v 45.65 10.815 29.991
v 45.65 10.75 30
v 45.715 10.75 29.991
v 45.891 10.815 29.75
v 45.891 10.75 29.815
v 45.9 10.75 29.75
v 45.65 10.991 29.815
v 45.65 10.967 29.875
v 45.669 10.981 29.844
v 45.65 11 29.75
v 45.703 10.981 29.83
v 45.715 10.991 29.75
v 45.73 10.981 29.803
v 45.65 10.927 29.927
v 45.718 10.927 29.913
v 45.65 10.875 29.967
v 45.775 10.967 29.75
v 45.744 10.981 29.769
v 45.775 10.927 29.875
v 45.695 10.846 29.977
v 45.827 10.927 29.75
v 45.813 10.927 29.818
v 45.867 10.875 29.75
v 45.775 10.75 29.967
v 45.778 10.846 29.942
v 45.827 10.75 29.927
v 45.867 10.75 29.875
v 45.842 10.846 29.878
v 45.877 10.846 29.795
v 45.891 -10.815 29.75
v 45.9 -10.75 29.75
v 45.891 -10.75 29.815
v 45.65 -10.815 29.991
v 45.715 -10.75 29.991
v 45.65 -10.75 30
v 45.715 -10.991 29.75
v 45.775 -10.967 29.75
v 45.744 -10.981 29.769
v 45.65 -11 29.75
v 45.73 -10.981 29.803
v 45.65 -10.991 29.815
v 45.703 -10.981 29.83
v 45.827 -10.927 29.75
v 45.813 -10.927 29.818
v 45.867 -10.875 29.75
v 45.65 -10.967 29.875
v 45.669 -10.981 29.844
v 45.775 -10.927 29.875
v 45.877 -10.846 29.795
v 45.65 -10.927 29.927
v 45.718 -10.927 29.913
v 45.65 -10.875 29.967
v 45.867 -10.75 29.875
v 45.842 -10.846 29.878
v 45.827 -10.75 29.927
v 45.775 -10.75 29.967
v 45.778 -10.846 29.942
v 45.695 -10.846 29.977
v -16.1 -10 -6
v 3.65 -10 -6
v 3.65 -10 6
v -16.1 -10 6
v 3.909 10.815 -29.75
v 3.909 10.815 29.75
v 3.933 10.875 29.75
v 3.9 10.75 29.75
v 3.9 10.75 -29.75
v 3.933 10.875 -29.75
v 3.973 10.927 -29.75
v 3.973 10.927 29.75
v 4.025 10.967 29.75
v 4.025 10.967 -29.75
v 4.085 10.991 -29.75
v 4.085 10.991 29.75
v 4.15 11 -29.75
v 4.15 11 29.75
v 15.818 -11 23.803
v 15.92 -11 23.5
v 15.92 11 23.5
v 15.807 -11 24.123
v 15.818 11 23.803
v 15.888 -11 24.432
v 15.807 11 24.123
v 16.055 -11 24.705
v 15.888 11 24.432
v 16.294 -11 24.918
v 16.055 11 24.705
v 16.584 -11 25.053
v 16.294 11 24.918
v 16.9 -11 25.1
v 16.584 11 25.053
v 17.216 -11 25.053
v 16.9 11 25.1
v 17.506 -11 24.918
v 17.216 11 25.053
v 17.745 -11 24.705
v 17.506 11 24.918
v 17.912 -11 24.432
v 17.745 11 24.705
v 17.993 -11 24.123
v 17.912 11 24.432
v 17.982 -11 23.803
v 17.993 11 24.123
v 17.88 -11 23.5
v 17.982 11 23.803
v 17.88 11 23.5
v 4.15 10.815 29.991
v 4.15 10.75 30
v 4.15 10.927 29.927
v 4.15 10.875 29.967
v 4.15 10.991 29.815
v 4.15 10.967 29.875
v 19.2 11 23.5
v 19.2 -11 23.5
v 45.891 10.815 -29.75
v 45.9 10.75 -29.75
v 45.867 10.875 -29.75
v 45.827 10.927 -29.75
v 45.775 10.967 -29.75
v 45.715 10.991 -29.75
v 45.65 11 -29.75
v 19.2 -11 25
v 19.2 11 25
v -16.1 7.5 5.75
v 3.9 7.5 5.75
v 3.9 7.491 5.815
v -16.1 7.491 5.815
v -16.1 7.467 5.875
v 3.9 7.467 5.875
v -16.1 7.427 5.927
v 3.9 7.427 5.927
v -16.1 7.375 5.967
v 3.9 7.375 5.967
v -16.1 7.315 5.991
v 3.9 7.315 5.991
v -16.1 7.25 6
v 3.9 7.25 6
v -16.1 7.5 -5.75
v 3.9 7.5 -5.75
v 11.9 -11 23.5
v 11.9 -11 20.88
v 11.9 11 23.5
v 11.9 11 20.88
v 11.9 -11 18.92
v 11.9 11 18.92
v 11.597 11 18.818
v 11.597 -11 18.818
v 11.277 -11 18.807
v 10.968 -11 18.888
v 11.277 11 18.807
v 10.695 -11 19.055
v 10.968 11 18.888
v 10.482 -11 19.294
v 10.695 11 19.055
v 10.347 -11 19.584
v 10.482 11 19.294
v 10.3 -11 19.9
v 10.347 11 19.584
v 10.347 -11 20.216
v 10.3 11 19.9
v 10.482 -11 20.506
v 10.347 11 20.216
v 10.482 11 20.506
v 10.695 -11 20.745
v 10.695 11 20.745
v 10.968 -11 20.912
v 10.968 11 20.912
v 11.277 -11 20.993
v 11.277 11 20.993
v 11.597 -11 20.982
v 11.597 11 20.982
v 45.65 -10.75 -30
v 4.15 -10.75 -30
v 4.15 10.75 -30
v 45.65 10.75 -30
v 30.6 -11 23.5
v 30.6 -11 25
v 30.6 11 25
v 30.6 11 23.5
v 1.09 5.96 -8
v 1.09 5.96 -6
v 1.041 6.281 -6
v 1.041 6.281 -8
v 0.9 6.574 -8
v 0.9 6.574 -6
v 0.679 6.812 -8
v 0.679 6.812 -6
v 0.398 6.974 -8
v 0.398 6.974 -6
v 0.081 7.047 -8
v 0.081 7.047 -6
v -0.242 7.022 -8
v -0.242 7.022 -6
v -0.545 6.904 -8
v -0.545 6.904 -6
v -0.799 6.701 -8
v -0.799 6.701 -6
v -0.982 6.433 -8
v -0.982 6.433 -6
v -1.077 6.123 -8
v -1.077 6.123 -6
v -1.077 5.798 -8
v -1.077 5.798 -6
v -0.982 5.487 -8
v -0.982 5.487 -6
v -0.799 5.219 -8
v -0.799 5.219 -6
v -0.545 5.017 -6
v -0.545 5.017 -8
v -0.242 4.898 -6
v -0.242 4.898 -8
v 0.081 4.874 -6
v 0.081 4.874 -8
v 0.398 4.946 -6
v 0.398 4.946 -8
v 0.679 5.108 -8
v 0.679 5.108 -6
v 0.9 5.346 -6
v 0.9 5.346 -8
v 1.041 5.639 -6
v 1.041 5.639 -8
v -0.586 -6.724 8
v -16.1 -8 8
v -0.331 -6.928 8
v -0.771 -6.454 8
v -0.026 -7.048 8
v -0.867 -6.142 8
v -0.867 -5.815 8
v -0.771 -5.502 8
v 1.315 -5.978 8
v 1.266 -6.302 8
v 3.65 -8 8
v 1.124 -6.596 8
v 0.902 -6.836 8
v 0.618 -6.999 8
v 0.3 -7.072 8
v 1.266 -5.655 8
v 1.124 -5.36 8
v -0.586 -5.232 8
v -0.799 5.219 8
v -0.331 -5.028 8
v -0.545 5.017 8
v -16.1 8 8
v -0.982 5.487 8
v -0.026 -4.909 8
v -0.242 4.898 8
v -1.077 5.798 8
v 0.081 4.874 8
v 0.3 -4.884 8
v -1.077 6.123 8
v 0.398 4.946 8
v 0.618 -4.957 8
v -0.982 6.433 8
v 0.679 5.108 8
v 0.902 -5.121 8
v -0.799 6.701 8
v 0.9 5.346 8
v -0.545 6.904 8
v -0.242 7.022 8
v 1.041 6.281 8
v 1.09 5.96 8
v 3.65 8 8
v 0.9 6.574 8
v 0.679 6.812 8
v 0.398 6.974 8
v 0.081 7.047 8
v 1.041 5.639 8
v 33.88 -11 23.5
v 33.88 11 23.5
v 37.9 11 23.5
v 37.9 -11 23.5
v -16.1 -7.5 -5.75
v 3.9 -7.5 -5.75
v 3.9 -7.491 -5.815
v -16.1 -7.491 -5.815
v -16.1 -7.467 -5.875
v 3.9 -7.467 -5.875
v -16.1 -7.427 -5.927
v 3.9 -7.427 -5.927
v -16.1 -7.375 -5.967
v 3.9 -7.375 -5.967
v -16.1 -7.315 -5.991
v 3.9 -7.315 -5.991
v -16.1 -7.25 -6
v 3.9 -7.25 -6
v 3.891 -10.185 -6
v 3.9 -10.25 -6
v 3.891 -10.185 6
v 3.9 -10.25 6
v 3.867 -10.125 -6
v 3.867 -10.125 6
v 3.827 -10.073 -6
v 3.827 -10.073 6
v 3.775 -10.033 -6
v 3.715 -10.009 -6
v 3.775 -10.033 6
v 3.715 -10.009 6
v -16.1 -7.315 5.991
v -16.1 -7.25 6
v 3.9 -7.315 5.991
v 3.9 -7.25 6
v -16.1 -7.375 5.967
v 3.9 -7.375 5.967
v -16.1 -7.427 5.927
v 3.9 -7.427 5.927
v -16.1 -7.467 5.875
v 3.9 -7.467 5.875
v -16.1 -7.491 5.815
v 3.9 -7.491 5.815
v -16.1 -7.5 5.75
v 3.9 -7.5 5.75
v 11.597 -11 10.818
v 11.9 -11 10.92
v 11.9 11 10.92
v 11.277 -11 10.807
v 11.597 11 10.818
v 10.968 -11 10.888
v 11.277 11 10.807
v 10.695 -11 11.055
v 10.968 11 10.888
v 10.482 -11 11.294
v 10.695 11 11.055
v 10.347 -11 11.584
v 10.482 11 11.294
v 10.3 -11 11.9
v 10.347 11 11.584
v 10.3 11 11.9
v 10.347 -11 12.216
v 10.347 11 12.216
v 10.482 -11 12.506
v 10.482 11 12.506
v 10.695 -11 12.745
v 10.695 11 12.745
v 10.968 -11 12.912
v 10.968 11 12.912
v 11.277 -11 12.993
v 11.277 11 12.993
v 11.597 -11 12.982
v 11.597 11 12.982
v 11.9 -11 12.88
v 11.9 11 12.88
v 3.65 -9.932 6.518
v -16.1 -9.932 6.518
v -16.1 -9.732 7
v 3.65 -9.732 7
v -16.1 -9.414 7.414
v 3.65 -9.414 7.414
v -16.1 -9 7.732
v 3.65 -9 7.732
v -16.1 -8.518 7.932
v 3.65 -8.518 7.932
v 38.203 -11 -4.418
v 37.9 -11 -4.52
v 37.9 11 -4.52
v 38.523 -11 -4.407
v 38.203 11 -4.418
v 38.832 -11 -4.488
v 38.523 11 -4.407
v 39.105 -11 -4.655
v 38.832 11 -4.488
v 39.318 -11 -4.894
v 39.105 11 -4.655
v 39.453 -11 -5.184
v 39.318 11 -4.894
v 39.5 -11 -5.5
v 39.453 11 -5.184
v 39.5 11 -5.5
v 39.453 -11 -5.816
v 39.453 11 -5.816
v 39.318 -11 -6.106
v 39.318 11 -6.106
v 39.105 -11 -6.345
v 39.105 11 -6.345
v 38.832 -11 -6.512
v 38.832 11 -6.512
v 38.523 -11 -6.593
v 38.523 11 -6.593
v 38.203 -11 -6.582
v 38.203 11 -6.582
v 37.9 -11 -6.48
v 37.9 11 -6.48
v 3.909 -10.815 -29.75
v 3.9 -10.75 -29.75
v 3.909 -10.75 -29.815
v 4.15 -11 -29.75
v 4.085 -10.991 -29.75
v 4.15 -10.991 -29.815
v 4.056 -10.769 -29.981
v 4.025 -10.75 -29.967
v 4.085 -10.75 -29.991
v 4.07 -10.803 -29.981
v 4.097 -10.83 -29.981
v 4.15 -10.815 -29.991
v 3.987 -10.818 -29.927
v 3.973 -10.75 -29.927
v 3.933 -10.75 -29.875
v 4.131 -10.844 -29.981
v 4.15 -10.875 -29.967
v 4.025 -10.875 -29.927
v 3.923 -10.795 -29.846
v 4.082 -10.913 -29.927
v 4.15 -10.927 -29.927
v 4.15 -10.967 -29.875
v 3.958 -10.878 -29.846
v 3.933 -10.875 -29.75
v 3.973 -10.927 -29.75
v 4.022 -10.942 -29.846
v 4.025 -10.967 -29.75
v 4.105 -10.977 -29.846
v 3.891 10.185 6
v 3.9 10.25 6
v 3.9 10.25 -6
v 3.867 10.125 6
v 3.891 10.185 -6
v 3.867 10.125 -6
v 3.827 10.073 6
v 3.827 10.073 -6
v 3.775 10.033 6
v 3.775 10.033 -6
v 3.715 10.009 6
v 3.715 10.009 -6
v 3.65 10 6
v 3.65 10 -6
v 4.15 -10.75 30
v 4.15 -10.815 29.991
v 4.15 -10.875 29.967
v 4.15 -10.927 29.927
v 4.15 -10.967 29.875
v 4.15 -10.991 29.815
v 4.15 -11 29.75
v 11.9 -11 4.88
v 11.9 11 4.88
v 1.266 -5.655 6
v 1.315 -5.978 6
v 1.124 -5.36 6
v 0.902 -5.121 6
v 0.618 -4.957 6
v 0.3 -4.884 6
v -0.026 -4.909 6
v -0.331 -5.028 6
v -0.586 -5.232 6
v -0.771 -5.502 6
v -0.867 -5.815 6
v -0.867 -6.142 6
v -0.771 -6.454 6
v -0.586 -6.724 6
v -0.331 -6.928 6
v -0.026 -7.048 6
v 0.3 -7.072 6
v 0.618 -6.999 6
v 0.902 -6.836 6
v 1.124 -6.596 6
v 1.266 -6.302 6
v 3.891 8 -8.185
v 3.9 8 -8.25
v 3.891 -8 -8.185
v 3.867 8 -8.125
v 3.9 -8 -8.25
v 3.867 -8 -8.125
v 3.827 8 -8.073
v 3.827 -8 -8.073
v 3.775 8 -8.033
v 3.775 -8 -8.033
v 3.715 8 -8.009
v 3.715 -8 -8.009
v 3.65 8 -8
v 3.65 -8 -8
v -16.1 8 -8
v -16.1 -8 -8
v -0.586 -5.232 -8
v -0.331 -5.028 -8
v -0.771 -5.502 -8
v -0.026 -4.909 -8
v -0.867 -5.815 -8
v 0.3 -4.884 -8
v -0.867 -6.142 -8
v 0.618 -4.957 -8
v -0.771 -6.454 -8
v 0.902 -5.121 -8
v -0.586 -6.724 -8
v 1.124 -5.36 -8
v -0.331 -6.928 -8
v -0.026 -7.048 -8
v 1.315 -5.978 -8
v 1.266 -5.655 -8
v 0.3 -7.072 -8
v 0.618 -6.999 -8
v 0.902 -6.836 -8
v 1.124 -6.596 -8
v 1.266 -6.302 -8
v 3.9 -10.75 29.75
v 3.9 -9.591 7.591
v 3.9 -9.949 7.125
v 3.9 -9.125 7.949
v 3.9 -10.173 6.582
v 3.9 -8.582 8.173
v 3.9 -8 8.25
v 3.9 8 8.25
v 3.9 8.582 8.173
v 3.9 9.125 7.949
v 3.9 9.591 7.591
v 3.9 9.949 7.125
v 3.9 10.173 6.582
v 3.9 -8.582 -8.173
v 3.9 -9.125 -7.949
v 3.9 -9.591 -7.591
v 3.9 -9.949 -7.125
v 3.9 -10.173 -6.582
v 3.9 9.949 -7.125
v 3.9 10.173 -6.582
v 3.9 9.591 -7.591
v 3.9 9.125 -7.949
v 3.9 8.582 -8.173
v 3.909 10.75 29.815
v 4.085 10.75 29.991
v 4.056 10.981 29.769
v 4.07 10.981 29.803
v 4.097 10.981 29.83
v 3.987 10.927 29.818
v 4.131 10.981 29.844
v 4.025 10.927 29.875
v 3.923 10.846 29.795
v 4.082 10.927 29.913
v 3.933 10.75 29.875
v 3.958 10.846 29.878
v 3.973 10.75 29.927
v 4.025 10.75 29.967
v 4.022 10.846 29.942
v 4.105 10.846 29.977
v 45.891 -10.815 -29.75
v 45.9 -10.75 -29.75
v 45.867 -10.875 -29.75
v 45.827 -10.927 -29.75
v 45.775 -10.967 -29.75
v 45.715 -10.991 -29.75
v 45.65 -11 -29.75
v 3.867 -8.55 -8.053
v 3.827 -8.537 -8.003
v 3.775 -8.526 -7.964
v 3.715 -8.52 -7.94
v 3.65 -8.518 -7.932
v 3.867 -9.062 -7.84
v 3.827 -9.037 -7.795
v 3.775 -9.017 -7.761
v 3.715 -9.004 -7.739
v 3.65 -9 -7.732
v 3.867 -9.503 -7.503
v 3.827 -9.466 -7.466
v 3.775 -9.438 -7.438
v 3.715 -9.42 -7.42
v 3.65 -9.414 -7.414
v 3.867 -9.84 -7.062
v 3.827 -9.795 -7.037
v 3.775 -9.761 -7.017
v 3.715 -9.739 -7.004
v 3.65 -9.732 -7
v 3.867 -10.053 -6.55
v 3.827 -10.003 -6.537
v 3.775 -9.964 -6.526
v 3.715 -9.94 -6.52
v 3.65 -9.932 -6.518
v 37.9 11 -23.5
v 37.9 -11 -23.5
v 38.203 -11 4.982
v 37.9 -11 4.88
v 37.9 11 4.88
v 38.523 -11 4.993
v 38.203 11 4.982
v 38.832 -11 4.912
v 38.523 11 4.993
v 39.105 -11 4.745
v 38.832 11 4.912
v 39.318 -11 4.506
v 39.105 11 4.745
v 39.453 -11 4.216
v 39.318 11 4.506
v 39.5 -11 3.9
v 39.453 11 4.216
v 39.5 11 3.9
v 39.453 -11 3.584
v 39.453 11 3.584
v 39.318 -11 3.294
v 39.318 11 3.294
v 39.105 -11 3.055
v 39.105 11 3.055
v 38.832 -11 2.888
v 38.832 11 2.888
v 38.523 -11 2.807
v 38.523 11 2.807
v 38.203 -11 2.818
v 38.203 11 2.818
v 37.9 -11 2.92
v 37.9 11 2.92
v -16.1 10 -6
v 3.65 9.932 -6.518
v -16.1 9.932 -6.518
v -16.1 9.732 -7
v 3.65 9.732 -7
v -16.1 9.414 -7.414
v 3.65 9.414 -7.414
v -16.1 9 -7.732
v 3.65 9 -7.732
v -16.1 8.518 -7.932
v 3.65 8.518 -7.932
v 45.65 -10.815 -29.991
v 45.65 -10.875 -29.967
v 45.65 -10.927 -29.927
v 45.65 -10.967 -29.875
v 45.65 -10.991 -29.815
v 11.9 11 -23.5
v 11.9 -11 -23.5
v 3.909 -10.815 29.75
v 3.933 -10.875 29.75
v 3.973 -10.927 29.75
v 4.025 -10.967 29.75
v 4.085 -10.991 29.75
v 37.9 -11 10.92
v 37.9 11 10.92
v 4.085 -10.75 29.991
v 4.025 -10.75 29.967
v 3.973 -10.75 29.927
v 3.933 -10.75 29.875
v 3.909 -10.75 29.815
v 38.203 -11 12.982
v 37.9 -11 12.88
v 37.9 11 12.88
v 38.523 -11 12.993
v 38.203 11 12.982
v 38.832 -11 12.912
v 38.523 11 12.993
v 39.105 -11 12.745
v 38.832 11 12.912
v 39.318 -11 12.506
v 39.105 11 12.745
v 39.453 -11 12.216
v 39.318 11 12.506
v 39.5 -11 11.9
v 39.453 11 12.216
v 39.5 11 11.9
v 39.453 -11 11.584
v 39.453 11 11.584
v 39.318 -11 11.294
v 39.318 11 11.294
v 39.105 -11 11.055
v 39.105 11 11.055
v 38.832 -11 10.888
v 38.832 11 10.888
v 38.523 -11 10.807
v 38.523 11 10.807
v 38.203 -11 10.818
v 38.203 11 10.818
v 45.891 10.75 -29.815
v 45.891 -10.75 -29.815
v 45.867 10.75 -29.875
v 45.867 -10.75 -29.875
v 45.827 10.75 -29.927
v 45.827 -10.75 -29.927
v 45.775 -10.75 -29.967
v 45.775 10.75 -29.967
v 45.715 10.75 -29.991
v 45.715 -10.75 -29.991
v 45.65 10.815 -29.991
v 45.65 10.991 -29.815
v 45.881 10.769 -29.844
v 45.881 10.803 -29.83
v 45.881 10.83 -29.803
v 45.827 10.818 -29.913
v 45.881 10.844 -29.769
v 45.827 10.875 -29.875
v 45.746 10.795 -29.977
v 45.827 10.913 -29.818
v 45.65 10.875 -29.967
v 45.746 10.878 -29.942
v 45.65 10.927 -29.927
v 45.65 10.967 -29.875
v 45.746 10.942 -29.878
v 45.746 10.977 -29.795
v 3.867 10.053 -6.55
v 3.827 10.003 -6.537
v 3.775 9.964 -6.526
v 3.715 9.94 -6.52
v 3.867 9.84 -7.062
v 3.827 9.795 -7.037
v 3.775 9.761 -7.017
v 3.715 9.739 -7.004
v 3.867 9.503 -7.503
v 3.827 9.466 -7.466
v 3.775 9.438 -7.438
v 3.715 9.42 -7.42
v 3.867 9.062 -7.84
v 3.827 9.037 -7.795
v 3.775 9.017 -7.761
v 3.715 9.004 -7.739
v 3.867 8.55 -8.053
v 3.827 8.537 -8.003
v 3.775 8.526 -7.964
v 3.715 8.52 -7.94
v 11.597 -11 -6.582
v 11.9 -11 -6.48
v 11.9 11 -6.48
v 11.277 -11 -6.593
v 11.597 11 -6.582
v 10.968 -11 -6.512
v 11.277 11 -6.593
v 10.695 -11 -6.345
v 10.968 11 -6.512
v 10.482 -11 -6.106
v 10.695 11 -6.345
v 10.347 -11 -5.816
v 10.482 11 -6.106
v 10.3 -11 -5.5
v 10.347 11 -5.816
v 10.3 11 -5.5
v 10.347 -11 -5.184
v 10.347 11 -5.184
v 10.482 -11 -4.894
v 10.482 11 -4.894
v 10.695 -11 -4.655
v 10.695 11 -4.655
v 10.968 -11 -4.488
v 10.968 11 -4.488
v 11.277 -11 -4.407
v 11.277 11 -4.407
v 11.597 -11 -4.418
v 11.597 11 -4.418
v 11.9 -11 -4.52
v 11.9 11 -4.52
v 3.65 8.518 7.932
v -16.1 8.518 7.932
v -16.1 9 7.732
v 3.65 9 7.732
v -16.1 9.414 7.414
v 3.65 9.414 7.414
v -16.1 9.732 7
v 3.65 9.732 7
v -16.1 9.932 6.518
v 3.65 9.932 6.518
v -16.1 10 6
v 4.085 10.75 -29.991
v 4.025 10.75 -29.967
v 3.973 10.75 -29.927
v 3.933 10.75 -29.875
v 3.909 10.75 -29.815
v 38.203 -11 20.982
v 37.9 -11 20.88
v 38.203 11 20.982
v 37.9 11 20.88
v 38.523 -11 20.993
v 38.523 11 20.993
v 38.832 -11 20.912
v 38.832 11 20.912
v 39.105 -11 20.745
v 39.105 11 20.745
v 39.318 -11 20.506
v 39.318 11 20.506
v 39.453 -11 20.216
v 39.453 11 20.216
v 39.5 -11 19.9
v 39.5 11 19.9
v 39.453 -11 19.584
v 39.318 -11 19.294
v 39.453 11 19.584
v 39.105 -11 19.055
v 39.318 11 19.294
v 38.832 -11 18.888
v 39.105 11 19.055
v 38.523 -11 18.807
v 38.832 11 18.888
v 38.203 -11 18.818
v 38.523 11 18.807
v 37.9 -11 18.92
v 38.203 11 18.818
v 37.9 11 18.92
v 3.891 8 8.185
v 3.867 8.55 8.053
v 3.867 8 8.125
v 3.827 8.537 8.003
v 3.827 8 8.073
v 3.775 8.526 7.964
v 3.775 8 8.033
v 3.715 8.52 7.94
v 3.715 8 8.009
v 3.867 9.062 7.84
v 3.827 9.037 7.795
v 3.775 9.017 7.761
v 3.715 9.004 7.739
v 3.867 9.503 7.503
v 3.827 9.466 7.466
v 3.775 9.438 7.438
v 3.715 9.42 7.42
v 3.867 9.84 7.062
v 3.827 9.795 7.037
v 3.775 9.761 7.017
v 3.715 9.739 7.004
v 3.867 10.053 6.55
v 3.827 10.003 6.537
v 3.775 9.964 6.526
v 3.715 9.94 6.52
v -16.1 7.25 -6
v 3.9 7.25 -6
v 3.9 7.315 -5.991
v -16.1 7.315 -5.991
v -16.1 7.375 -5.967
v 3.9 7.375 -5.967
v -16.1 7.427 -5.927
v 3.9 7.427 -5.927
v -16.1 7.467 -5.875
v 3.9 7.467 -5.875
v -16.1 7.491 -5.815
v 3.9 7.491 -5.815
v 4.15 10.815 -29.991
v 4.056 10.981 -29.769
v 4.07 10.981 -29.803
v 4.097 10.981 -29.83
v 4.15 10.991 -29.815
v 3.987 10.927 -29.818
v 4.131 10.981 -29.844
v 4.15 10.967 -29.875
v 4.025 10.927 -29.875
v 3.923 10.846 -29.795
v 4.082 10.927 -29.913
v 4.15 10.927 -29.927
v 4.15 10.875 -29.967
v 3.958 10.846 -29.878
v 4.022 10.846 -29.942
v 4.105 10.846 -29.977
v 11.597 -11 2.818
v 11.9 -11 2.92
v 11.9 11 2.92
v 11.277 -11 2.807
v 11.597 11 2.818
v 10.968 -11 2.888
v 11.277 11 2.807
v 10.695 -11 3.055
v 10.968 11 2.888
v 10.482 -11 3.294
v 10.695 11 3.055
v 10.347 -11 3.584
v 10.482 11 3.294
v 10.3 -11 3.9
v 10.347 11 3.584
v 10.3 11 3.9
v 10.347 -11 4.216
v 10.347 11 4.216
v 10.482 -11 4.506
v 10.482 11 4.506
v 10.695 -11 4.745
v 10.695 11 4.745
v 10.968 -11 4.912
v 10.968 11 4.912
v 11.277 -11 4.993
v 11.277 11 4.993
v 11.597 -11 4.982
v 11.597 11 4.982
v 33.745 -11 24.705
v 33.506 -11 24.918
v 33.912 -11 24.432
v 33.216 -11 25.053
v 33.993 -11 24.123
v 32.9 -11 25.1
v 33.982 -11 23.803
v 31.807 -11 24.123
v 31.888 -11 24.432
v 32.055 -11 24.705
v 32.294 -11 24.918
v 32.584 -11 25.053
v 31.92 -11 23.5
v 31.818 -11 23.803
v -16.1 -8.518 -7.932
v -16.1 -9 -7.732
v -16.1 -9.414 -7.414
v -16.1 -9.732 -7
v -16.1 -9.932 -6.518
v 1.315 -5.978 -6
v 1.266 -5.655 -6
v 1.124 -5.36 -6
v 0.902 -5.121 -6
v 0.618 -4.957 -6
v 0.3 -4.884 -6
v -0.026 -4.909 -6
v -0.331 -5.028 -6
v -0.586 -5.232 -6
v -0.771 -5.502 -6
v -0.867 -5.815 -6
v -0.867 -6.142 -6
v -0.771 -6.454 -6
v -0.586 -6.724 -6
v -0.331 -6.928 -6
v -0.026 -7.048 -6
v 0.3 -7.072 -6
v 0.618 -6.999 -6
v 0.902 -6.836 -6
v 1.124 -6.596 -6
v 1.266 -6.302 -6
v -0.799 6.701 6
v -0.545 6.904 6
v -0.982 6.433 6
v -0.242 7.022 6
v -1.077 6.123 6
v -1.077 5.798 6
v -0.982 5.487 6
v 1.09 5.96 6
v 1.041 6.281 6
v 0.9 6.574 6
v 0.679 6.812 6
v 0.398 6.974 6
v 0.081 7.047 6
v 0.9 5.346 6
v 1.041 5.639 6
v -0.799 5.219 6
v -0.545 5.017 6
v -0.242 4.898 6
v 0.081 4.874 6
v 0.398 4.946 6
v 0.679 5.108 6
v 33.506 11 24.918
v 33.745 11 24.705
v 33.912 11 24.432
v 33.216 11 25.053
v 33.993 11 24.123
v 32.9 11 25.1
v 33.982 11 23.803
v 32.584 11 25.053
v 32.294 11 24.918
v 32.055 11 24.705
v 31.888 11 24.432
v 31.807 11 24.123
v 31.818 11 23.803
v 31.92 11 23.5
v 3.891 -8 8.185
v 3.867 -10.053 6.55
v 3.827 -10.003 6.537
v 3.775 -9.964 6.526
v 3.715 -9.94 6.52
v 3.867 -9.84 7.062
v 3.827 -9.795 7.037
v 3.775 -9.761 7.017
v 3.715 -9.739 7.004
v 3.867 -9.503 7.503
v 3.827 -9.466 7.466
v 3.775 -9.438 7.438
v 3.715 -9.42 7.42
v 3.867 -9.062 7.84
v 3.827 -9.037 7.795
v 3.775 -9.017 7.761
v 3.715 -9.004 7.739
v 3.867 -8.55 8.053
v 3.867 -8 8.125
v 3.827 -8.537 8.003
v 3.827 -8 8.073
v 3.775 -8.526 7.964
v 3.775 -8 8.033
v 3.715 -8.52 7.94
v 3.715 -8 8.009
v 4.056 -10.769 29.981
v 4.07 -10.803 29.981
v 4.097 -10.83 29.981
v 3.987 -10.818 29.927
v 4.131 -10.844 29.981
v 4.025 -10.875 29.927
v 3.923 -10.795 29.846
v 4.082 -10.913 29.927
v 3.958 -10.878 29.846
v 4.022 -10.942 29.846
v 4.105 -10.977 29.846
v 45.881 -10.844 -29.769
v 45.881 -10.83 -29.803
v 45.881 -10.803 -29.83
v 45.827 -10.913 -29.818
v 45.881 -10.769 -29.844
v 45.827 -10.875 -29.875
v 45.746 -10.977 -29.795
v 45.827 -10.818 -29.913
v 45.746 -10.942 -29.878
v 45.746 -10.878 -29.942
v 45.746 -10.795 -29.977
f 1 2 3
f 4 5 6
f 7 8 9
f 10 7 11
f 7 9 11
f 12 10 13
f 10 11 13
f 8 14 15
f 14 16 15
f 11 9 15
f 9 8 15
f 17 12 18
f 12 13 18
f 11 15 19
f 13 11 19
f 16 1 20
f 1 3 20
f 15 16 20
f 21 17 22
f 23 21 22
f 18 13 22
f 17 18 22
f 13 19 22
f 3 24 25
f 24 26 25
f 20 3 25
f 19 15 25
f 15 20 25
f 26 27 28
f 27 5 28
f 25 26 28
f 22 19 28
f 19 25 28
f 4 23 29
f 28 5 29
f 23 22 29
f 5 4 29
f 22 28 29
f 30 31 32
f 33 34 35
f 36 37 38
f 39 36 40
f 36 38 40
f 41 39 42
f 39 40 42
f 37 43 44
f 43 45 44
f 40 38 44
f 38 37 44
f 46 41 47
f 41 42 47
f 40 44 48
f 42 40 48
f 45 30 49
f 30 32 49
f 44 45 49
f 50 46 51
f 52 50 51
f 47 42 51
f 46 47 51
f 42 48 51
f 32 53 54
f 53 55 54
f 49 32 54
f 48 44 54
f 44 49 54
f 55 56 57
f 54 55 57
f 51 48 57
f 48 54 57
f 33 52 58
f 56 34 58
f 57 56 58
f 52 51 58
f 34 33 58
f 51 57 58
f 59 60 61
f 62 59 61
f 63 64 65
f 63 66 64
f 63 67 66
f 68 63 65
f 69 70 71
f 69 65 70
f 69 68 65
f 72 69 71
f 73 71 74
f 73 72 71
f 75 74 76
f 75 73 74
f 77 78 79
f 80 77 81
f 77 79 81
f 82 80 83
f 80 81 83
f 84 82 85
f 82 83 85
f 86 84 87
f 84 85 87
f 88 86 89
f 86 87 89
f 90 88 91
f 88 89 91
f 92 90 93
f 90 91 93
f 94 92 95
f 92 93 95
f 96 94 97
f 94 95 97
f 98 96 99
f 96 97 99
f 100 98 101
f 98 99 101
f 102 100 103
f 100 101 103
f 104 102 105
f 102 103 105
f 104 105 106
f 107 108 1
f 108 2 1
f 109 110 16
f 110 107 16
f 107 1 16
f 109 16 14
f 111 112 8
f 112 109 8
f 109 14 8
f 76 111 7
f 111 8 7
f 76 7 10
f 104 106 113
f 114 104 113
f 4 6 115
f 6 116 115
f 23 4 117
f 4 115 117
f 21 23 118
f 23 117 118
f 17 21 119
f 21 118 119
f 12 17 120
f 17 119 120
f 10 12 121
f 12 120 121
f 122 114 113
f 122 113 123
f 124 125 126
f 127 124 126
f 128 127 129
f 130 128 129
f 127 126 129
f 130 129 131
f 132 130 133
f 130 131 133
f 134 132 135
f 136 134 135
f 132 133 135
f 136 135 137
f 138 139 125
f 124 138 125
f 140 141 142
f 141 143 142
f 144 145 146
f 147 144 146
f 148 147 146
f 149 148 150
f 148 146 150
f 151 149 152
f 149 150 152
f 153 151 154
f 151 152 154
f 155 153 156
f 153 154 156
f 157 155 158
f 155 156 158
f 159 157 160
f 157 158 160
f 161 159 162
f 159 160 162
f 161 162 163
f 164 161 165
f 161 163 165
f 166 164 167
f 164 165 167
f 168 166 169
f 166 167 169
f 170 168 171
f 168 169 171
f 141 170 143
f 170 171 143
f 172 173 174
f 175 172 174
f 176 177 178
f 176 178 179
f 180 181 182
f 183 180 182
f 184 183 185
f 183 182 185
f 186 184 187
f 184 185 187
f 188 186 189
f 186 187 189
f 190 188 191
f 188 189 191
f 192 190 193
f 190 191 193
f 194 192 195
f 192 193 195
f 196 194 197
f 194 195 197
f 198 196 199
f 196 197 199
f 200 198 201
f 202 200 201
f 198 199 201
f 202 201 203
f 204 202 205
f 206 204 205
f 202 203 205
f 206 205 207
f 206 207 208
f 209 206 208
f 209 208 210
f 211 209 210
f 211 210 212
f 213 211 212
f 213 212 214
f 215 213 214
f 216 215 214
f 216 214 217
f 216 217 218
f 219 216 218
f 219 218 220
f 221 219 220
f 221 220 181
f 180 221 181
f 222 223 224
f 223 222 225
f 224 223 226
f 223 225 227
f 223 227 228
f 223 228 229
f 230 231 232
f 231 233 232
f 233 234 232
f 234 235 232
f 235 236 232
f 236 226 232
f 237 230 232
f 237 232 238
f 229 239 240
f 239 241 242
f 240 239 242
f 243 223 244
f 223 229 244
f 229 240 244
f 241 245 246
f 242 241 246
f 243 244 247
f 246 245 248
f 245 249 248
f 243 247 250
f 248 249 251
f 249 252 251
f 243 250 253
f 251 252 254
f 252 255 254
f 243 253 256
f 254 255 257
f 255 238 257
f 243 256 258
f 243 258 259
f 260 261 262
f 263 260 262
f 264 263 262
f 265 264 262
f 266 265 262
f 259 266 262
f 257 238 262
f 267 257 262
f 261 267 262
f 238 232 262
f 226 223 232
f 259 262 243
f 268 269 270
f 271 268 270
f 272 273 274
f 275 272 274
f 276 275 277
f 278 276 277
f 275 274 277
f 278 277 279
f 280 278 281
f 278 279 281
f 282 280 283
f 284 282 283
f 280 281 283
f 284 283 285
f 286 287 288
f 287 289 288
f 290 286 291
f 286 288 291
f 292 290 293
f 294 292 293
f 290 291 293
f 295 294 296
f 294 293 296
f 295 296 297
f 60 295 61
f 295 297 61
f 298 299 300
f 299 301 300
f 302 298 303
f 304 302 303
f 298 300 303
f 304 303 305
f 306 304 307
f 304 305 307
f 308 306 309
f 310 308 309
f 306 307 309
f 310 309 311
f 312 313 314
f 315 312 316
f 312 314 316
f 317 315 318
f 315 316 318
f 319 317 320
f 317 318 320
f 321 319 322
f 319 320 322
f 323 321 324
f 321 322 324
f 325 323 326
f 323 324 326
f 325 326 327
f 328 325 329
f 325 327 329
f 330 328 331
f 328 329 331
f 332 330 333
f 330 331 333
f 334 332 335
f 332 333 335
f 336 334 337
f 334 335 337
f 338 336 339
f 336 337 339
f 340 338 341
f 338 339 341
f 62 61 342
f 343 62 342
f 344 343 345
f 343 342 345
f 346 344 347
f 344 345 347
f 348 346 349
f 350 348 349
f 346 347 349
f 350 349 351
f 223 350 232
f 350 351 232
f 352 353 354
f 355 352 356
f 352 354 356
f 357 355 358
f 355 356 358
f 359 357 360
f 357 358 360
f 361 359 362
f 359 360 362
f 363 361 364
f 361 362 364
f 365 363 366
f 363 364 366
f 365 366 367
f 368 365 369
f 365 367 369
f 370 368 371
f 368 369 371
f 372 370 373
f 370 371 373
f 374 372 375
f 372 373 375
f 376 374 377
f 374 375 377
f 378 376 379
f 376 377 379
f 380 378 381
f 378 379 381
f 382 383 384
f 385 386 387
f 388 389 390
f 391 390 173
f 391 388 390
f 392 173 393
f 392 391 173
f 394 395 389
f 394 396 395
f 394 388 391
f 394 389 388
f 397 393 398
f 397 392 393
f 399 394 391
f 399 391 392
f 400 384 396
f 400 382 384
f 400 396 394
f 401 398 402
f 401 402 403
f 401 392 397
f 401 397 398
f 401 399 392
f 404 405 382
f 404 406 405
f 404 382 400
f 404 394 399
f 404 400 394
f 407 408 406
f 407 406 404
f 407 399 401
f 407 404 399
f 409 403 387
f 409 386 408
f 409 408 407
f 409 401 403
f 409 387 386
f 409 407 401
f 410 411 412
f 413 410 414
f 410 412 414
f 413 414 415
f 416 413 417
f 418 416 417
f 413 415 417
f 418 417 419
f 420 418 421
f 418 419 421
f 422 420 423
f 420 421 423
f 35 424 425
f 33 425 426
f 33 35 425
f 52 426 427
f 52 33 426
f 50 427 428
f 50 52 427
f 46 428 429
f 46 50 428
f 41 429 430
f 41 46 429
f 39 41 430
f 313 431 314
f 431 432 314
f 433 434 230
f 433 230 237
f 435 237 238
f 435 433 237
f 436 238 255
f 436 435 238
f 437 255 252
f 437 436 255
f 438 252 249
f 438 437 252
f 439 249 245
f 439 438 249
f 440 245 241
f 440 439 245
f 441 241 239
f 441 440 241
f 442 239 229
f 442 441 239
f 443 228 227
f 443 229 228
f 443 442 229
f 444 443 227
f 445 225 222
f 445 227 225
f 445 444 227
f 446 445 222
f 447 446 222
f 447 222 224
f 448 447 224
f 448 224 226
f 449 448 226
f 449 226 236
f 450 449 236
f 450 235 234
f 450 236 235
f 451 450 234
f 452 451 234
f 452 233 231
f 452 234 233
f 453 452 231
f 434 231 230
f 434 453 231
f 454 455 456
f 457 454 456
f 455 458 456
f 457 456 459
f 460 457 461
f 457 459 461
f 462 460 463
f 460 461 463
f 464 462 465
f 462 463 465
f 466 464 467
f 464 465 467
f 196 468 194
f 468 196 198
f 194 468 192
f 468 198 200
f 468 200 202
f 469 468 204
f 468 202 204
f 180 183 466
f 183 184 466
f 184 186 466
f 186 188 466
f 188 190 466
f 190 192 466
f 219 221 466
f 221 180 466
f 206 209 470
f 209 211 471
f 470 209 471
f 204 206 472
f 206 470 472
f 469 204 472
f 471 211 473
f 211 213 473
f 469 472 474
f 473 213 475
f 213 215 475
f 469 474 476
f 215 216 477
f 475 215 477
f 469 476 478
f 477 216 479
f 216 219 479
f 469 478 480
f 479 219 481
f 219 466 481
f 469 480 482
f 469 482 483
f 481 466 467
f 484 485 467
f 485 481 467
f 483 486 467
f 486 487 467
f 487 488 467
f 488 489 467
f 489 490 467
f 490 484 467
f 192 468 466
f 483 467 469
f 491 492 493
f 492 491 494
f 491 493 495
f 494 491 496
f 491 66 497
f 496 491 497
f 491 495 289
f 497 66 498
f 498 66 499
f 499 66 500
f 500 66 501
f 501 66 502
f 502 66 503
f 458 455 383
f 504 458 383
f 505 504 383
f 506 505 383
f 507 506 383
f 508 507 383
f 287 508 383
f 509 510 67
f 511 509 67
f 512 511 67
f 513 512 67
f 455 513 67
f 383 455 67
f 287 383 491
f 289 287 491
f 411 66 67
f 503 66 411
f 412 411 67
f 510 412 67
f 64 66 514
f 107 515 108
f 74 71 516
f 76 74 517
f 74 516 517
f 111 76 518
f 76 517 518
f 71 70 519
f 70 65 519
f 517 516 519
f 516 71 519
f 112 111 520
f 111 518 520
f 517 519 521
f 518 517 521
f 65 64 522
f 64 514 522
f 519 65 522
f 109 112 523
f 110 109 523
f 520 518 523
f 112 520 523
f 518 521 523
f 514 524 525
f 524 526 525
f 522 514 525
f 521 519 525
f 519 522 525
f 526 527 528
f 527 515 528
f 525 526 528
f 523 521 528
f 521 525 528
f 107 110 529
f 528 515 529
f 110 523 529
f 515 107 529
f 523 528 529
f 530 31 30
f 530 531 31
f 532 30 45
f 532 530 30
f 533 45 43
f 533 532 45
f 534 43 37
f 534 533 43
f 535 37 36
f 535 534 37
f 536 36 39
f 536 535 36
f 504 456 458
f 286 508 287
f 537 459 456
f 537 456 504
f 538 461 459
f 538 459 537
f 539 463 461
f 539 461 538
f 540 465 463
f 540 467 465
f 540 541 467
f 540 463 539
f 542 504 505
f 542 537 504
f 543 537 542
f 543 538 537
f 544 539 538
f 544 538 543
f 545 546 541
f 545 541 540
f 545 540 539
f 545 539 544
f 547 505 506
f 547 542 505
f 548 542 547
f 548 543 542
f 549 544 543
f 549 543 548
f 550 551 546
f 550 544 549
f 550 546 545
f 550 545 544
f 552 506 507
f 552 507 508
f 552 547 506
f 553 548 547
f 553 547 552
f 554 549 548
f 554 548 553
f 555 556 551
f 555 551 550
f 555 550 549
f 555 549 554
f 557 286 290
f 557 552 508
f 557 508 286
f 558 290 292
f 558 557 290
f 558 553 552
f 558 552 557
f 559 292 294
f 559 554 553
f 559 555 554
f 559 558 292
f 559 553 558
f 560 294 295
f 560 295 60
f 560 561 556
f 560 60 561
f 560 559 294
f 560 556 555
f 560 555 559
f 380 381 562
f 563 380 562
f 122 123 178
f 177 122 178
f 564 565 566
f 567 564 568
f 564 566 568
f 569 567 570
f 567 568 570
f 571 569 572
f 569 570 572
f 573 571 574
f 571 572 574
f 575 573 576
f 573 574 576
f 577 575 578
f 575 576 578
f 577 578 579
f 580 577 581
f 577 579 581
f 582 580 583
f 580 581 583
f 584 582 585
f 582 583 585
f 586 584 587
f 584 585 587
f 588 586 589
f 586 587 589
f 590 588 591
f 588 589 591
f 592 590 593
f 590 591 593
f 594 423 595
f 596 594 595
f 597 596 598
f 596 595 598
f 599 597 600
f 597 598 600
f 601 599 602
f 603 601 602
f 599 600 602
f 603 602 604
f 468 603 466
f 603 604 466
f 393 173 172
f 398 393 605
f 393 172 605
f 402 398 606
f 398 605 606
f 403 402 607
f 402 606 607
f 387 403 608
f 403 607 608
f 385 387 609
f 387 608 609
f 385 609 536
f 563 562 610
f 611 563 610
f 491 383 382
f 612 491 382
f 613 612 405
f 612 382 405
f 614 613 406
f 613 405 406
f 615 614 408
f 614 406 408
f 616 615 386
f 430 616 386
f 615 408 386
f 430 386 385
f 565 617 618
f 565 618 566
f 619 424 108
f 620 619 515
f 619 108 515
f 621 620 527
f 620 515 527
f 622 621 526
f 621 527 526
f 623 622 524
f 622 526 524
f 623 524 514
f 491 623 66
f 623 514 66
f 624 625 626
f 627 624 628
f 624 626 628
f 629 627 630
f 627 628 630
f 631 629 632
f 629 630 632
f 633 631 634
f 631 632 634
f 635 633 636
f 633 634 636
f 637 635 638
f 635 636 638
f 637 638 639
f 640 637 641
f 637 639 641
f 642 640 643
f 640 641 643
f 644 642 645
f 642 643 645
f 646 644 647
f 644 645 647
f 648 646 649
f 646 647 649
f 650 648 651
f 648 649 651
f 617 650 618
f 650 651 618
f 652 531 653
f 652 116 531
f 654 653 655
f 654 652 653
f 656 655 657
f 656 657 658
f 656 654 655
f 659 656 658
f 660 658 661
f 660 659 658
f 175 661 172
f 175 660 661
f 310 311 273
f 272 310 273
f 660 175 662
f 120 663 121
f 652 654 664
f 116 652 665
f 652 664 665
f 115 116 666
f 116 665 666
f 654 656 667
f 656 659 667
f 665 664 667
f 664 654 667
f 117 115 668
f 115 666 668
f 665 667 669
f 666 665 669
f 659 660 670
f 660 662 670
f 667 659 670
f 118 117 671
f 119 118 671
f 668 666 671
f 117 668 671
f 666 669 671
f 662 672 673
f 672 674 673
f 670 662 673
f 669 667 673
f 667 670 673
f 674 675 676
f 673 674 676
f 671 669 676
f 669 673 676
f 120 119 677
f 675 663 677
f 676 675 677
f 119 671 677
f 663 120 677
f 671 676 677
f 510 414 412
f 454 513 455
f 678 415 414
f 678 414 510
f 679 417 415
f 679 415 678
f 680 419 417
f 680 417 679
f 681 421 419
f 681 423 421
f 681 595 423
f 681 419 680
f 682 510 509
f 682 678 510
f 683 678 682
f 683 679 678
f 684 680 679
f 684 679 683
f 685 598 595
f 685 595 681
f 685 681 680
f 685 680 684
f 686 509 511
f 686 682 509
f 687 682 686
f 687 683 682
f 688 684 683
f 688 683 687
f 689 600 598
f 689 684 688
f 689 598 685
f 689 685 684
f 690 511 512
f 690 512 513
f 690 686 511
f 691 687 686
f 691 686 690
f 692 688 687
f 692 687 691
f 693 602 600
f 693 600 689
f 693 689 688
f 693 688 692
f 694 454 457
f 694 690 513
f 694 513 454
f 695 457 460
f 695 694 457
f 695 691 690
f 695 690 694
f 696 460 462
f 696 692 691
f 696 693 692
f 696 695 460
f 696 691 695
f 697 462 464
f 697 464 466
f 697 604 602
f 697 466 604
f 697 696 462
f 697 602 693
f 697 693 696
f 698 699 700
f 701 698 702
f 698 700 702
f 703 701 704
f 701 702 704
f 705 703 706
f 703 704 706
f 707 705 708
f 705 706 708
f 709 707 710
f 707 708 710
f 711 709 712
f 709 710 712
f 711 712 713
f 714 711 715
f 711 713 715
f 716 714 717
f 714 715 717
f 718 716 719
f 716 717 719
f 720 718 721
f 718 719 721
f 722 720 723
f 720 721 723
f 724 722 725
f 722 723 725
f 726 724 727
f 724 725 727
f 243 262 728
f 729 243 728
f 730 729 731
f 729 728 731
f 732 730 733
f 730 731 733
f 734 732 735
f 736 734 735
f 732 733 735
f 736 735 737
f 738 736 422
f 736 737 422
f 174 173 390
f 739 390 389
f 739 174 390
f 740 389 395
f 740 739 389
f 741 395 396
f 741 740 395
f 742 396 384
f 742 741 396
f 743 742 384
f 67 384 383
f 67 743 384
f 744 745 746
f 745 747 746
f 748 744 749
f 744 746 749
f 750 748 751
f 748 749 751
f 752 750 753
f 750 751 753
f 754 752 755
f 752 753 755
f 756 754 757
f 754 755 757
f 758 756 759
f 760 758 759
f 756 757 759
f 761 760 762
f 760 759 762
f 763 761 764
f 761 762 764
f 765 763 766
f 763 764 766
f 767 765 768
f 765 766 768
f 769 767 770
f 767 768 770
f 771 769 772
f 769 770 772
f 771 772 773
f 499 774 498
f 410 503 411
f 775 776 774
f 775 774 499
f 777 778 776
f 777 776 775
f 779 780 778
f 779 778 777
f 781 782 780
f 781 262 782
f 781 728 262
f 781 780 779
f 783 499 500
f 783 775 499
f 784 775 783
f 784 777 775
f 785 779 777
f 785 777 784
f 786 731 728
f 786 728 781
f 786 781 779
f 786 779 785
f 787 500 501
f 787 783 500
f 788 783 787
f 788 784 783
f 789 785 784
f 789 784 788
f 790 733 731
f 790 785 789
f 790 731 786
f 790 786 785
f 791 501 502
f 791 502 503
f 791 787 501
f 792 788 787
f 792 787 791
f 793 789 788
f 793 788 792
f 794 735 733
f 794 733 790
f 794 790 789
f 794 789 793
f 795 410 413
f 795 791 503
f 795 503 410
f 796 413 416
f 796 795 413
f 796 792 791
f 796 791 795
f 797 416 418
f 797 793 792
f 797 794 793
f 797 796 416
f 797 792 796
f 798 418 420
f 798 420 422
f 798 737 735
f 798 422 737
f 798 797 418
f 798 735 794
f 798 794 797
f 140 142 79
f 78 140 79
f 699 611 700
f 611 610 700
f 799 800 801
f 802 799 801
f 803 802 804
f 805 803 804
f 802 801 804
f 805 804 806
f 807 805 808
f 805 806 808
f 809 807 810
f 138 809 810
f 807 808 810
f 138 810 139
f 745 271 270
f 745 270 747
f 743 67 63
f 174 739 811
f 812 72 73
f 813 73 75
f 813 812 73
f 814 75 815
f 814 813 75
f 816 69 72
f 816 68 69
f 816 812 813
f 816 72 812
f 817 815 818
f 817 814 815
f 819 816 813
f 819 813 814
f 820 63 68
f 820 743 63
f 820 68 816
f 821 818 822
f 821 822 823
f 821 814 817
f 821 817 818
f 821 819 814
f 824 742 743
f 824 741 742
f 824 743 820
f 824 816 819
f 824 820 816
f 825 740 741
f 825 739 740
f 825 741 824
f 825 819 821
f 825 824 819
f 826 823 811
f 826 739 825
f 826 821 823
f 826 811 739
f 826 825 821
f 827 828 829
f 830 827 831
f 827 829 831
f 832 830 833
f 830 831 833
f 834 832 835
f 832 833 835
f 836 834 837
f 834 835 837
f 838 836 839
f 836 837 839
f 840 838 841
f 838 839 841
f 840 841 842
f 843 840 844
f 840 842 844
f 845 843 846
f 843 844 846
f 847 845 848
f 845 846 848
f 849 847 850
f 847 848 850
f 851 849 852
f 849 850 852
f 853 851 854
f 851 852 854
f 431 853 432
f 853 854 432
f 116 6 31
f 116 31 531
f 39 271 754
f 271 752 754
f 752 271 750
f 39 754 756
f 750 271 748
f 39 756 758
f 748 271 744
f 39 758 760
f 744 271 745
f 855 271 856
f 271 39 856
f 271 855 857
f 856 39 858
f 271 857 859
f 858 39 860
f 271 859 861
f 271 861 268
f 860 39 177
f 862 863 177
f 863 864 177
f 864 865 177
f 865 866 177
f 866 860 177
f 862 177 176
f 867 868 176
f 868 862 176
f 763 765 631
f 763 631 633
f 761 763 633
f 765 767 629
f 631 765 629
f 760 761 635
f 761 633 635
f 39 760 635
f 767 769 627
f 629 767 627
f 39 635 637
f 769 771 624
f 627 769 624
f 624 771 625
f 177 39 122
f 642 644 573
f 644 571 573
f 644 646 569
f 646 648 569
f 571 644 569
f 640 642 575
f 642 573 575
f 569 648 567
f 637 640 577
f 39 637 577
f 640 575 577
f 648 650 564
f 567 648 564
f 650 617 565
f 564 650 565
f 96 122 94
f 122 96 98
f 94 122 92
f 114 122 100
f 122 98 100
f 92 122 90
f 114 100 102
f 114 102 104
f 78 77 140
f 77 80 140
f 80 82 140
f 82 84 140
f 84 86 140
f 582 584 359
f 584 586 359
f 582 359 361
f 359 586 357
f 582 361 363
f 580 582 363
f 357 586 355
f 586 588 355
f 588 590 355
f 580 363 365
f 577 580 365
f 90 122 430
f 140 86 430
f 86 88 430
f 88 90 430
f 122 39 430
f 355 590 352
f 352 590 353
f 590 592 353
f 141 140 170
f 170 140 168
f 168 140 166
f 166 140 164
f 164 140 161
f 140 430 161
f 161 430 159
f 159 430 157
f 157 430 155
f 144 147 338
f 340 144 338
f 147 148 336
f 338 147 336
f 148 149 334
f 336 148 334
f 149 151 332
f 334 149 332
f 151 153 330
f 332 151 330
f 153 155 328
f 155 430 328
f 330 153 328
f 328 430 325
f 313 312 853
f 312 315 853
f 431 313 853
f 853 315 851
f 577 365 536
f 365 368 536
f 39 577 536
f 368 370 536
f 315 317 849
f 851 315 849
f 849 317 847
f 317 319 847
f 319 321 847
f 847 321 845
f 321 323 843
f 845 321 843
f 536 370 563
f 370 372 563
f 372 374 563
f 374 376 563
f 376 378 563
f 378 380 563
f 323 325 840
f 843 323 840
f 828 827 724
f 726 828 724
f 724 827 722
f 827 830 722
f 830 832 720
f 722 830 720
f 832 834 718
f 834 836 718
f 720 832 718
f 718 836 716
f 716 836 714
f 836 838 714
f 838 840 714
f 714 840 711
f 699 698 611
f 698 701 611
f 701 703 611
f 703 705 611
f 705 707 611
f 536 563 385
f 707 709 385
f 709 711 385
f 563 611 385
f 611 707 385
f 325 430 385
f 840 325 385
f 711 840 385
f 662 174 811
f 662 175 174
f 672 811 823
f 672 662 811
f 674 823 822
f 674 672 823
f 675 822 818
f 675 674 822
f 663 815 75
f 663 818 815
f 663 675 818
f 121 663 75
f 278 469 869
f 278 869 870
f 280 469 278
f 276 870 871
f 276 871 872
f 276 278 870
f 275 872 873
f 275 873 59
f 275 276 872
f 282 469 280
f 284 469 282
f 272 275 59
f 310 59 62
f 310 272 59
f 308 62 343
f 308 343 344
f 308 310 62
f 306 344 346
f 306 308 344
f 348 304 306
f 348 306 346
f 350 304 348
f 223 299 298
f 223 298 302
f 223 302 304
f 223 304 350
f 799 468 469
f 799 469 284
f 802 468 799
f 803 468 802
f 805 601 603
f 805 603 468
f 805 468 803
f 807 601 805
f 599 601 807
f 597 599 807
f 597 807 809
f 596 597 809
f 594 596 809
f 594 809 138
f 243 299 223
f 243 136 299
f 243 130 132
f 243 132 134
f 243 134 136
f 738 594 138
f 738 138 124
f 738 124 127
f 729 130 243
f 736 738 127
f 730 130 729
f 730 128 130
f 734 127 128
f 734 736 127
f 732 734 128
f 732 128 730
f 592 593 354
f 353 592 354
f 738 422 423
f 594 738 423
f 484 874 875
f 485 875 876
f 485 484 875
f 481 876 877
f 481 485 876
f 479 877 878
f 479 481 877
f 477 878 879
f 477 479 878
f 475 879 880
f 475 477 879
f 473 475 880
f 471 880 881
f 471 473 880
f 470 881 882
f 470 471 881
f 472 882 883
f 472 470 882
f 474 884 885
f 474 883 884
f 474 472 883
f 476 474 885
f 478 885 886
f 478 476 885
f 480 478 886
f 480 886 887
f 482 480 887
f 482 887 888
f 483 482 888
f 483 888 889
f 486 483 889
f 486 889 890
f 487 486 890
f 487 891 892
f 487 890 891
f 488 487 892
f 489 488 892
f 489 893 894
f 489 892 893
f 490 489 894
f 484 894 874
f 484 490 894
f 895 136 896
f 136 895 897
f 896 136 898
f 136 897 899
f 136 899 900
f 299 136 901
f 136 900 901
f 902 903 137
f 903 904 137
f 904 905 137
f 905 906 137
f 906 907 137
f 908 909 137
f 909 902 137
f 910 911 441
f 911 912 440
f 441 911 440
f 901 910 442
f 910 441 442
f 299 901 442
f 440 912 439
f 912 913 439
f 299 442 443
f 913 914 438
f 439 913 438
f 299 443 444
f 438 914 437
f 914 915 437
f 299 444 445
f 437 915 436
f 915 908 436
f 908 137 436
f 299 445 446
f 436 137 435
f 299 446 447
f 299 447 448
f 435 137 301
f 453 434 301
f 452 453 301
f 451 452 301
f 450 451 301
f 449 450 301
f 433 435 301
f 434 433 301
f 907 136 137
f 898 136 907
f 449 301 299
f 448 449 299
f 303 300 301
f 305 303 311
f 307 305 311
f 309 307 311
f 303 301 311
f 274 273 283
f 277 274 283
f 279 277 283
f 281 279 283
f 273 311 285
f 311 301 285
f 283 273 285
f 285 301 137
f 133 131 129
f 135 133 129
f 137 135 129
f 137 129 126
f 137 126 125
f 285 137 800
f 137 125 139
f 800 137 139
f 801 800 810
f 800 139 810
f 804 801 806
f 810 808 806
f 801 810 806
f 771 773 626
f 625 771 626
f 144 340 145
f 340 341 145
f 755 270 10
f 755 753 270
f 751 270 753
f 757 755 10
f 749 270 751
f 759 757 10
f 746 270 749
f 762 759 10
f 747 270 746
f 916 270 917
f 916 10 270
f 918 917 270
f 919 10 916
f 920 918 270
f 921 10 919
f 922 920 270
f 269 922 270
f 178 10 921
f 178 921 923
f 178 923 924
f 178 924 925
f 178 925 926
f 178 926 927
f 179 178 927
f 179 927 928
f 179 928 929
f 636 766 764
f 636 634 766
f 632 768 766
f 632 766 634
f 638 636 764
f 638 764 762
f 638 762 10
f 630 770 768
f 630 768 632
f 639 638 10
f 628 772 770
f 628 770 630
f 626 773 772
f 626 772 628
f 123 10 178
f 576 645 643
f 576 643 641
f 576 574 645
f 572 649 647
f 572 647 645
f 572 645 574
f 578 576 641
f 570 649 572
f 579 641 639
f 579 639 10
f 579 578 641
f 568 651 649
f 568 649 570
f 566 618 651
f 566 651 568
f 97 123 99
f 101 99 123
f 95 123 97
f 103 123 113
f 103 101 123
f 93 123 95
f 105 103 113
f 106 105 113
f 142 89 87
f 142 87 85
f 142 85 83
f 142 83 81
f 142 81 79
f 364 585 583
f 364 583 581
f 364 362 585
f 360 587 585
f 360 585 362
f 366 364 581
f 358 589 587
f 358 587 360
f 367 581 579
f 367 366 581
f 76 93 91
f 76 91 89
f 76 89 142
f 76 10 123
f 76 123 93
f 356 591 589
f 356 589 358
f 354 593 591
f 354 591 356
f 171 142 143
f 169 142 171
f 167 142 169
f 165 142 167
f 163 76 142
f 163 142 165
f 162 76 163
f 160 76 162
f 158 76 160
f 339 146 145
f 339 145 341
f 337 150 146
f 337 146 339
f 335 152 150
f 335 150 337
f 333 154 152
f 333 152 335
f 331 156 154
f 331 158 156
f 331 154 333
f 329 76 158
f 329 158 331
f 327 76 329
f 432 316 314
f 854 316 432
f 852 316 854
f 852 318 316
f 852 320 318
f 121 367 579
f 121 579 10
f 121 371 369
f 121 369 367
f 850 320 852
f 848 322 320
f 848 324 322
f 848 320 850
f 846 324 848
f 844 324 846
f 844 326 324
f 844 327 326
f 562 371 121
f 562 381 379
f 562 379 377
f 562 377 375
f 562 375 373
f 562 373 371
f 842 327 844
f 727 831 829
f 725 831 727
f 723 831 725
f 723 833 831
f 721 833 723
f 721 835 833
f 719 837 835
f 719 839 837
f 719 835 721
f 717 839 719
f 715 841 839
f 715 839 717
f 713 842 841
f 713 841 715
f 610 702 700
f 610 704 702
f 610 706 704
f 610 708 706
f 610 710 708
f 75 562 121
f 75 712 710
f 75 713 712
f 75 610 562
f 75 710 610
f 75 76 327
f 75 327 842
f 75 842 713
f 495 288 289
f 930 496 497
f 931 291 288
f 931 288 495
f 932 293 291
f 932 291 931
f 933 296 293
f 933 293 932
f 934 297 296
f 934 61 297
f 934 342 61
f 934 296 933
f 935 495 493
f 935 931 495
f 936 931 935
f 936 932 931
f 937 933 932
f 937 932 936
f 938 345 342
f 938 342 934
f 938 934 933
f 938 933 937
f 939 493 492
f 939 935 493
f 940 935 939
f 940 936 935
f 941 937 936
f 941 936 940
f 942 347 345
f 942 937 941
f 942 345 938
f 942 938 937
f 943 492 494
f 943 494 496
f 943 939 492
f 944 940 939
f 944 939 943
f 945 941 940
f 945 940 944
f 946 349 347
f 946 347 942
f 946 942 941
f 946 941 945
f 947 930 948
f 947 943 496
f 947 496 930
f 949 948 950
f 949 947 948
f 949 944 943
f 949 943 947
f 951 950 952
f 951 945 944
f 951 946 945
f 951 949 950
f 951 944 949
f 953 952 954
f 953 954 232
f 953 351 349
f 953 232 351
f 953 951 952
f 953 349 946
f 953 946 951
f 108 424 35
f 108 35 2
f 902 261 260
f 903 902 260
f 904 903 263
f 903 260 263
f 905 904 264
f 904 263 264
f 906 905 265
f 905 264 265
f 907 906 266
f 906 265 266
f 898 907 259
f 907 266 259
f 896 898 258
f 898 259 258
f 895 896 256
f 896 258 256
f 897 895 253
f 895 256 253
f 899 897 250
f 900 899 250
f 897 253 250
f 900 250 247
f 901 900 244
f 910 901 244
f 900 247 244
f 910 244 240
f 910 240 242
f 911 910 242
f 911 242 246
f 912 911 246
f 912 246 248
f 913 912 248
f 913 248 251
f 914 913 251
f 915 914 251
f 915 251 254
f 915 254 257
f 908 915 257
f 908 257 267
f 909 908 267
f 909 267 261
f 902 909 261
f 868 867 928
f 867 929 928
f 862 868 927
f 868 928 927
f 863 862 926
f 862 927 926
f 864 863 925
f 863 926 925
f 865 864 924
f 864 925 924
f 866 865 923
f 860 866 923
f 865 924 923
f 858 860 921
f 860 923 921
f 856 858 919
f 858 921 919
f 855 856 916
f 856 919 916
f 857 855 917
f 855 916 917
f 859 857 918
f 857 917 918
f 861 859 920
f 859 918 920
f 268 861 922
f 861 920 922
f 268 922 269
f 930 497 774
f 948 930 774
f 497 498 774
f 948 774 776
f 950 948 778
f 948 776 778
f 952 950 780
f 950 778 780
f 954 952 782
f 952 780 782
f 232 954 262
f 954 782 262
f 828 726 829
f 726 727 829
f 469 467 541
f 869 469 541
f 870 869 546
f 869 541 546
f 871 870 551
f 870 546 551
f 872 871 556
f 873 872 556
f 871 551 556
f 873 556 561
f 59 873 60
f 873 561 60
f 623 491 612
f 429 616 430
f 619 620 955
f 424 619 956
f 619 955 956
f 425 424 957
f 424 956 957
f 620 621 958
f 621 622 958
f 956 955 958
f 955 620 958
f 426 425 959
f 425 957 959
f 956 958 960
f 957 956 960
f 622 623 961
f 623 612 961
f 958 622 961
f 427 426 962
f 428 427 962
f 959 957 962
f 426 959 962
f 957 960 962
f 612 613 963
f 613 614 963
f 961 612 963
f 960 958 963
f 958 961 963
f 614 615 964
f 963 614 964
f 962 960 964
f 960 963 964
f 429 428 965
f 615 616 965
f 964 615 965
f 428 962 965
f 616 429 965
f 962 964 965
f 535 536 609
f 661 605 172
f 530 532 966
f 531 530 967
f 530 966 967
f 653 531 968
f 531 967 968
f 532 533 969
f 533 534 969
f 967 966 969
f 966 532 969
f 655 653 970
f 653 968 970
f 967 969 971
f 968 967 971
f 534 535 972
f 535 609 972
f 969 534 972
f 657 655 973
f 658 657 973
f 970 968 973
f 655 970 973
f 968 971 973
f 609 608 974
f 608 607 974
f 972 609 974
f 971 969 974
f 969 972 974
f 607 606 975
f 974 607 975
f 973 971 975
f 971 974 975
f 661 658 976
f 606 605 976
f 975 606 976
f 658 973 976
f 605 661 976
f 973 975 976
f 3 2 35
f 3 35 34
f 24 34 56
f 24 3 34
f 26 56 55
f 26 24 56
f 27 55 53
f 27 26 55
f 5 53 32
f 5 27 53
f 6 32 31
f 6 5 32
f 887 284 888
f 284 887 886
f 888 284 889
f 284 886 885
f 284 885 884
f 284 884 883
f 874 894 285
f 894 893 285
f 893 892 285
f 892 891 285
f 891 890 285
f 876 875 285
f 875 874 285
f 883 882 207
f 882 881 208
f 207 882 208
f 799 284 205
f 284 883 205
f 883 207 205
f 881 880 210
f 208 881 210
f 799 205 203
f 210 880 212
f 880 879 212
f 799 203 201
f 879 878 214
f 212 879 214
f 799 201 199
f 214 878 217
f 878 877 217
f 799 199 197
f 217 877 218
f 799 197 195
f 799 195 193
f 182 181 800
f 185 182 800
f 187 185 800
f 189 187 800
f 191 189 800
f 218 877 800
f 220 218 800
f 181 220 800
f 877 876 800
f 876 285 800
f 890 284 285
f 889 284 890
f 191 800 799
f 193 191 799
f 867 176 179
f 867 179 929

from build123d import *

# Parameters (mm, degrees)
BOSS_EXTRUDE3_DEPTH      = 3.9
BOSS_EXTRUDE3_DEPTH_BACK = 16.1
SKETCH8_R                = 1.089581078
CUT_EXTRUDE2_DEPTH       = 23.9
SKETCH9_R                = 1.096990471
CUT_EXTRUDE3_DEPTH       = 23.9
SKETCH14_W               = 60
SKETCH14_H               = 22
BOSS_EXTRUDE4_DEPTH      = 42
CUT_EXTRUDE4_DEPTH       = 22
CUT_EXTRUDE4_DEPTH_BACK  = 25
FILLET5_R                = 0.25
SKETCH20_R               = 1.1
CUT_EXTRUDE6_DEPTH       = 110
SKETCH23_R               = 1.1
CUT_EXTRUDE7_DEPTH       = 110


with BuildPart() as part:
    # Sketch1 → Boss-Extrude3 (new body, two sides)
    with BuildSketch(Plane(origin=(0, 0, 0), x_dir=(0, 0, -1), z_dir=(1, 0, 0))) as boss_extrude3_sk:
        with BuildLine():
            ThreePointArc((-6, -10), (-7.414213562, -9.414213562), (-8, -8))
            Line((-8, -8), (-8, 8))
            ThreePointArc((-8, 8), (-7.414213562, 9.414213562), (-6, 10))
            Line((-6, 10), (6, 10))
            ThreePointArc((6, 10), (7.414213562, 9.414213562), (8, 8))
            Line((8, 8), (8, -8))
            ThreePointArc((8, -8), (7.414213562, -9.414213562), (6, -10))
            Line((6, -10), (-6, -10))
        make_face()
        with BuildLine():
            ThreePointArc((-6, -7.25), (-5.926776695, -7.426776695), (-5.75, -7.5))
            Line((-5.75, -7.5), (5.75, -7.5))
            ThreePointArc((5.75, -7.5), (5.926776695, -7.426776695), (6, -7.25))
            Line((6, -7.25), (6, 7.25))
            ThreePointArc((6, 7.25), (5.926776695, 7.426776695), (5.75, 7.5))
            Line((5.75, 7.5), (-5.75, 7.5))
            ThreePointArc((-5.75, 7.5), (-5.926776695, 7.426776695), (-6, 7.25))
            Line((-6, 7.25), (-6, -7.25))
        make_face(mode=Mode.SUBTRACT)
    extrude(amount=BOSS_EXTRUDE3_DEPTH)
    extrude(boss_extrude3_sk.sketch, amount=-BOSS_EXTRUDE3_DEPTH_BACK)

    # Sketch8 → Cut-Extrude2 (cut)
    with BuildSketch(Plane.XY.offset(8)):
        with Locations((0, 5.960174238)):
            Circle(SKETCH8_R)
    extrude(amount=-CUT_EXTRUDE2_DEPTH, mode=Mode.SUBTRACT)

    # Sketch9 → Cut-Extrude3 (cut)
    with BuildSketch(Plane.XY.offset(-8)):
        with Locations((0.217674261, -5.978268898)):
            Circle(SKETCH9_R)
    extrude(amount=CUT_EXTRUDE3_DEPTH, mode=Mode.SUBTRACT)

    # Sketch14 → Boss-Extrude4 (add)
    with BuildSketch(Plane(origin=(3.9, 0, 0), x_dir=(0, 0, -1), z_dir=(1, 0, 0))):
        Rectangle(SKETCH14_W, SKETCH14_H)
    extrude(amount=BOSS_EXTRUDE4_DEPTH)

    # Sketch19 → Cut-Extrude4 (cut, two sides)
    with BuildSketch(Plane(origin=(0, 0, 0), x_dir=(1, 0, 0), z_dir=(0, 1, 0))) as cut_extrude4_sk:
        Polygon((11.9, -23.5), (19.2, -23.5), (19.2, -25), (30.6, -25), (30.6, -23.5), (37.9, -23.5), (37.9, 23.5), (11.9, 23.5), align=None)
    extrude(amount=CUT_EXTRUDE4_DEPTH, mode=Mode.SUBTRACT)
    extrude(cut_extrude4_sk.sketch, amount=-CUT_EXTRUDE4_DEPTH_BACK, mode=Mode.SUBTRACT)

    # Fillet5
    fillet5_edges = [part.edges().sort_by_distance(p)[0] for p in [
        (3.9, -11, 0),
        (3.9, 0, 30),
        (3.9, 0, -30),
        (24.9, -11, -30),
        (3.9, 11, 0),
        (24.9, 11, -30),
        (45.9, 0, 30),
        (24.9, 11, 30),
        (45.9, -11, 0),
        (24.9, -11, 30),
        (45.9, 0, -30),
        (45.9, 11, 0),
        (3.9, -9.414213562, 7.414213562),
        (3.9, -10, 0),
        (3.9, 9.414213562, -7.414213562),
        (3.9, 0, 8),
        (3.9, -9.414213562, -7.414213562),
        (3.9, 0, -8),
        (3.9, 10, 0),
        (3.9, 9.414213562, 7.414213562),
    ]]
    fillet(fillet5_edges, radius=FILLET5_R)

    # Sketch20 → Cut-Extrude6 (cut)
    with BuildSketch(Plane(origin=(0, 11, 0), x_dir=(1, 0, 0), z_dir=(0, 1, 0))):
        with Locations((11.4, 5.5)):
            Circle(SKETCH20_R)
        with Locations((11.4, -3.9)):
            Circle(SKETCH20_R)
        with Locations((11.4, -11.9)):
            Circle(SKETCH20_R)
        with Locations((11.4, -19.9)):
            Circle(SKETCH20_R)
        with Locations((38.4, -19.9)):
            Circle(SKETCH20_R)
        with Locations((38.4, -11.9)):
            Circle(SKETCH20_R)
        with Locations((38.4, -3.9)):
            Circle(SKETCH20_R)
        with Locations((38.4, 5.5)):
            Circle(SKETCH20_R)
    extrude(amount=-CUT_EXTRUDE6_DEPTH, mode=Mode.SUBTRACT)

    # Sketch23 → Cut-Extrude7 (cut)
    with BuildSketch(Plane(origin=(0, 11, 0), x_dir=(1, 0, 0), z_dir=(0, 1, 0))):
        with Locations((16.9, -24)):
            Circle(SKETCH23_R)
        with Locations((32.9, -24)):
            Circle(SKETCH23_R)
    extrude(amount=-CUT_EXTRUDE7_DEPTH, mode=Mode.SUBTRACT)


solid = part.part
